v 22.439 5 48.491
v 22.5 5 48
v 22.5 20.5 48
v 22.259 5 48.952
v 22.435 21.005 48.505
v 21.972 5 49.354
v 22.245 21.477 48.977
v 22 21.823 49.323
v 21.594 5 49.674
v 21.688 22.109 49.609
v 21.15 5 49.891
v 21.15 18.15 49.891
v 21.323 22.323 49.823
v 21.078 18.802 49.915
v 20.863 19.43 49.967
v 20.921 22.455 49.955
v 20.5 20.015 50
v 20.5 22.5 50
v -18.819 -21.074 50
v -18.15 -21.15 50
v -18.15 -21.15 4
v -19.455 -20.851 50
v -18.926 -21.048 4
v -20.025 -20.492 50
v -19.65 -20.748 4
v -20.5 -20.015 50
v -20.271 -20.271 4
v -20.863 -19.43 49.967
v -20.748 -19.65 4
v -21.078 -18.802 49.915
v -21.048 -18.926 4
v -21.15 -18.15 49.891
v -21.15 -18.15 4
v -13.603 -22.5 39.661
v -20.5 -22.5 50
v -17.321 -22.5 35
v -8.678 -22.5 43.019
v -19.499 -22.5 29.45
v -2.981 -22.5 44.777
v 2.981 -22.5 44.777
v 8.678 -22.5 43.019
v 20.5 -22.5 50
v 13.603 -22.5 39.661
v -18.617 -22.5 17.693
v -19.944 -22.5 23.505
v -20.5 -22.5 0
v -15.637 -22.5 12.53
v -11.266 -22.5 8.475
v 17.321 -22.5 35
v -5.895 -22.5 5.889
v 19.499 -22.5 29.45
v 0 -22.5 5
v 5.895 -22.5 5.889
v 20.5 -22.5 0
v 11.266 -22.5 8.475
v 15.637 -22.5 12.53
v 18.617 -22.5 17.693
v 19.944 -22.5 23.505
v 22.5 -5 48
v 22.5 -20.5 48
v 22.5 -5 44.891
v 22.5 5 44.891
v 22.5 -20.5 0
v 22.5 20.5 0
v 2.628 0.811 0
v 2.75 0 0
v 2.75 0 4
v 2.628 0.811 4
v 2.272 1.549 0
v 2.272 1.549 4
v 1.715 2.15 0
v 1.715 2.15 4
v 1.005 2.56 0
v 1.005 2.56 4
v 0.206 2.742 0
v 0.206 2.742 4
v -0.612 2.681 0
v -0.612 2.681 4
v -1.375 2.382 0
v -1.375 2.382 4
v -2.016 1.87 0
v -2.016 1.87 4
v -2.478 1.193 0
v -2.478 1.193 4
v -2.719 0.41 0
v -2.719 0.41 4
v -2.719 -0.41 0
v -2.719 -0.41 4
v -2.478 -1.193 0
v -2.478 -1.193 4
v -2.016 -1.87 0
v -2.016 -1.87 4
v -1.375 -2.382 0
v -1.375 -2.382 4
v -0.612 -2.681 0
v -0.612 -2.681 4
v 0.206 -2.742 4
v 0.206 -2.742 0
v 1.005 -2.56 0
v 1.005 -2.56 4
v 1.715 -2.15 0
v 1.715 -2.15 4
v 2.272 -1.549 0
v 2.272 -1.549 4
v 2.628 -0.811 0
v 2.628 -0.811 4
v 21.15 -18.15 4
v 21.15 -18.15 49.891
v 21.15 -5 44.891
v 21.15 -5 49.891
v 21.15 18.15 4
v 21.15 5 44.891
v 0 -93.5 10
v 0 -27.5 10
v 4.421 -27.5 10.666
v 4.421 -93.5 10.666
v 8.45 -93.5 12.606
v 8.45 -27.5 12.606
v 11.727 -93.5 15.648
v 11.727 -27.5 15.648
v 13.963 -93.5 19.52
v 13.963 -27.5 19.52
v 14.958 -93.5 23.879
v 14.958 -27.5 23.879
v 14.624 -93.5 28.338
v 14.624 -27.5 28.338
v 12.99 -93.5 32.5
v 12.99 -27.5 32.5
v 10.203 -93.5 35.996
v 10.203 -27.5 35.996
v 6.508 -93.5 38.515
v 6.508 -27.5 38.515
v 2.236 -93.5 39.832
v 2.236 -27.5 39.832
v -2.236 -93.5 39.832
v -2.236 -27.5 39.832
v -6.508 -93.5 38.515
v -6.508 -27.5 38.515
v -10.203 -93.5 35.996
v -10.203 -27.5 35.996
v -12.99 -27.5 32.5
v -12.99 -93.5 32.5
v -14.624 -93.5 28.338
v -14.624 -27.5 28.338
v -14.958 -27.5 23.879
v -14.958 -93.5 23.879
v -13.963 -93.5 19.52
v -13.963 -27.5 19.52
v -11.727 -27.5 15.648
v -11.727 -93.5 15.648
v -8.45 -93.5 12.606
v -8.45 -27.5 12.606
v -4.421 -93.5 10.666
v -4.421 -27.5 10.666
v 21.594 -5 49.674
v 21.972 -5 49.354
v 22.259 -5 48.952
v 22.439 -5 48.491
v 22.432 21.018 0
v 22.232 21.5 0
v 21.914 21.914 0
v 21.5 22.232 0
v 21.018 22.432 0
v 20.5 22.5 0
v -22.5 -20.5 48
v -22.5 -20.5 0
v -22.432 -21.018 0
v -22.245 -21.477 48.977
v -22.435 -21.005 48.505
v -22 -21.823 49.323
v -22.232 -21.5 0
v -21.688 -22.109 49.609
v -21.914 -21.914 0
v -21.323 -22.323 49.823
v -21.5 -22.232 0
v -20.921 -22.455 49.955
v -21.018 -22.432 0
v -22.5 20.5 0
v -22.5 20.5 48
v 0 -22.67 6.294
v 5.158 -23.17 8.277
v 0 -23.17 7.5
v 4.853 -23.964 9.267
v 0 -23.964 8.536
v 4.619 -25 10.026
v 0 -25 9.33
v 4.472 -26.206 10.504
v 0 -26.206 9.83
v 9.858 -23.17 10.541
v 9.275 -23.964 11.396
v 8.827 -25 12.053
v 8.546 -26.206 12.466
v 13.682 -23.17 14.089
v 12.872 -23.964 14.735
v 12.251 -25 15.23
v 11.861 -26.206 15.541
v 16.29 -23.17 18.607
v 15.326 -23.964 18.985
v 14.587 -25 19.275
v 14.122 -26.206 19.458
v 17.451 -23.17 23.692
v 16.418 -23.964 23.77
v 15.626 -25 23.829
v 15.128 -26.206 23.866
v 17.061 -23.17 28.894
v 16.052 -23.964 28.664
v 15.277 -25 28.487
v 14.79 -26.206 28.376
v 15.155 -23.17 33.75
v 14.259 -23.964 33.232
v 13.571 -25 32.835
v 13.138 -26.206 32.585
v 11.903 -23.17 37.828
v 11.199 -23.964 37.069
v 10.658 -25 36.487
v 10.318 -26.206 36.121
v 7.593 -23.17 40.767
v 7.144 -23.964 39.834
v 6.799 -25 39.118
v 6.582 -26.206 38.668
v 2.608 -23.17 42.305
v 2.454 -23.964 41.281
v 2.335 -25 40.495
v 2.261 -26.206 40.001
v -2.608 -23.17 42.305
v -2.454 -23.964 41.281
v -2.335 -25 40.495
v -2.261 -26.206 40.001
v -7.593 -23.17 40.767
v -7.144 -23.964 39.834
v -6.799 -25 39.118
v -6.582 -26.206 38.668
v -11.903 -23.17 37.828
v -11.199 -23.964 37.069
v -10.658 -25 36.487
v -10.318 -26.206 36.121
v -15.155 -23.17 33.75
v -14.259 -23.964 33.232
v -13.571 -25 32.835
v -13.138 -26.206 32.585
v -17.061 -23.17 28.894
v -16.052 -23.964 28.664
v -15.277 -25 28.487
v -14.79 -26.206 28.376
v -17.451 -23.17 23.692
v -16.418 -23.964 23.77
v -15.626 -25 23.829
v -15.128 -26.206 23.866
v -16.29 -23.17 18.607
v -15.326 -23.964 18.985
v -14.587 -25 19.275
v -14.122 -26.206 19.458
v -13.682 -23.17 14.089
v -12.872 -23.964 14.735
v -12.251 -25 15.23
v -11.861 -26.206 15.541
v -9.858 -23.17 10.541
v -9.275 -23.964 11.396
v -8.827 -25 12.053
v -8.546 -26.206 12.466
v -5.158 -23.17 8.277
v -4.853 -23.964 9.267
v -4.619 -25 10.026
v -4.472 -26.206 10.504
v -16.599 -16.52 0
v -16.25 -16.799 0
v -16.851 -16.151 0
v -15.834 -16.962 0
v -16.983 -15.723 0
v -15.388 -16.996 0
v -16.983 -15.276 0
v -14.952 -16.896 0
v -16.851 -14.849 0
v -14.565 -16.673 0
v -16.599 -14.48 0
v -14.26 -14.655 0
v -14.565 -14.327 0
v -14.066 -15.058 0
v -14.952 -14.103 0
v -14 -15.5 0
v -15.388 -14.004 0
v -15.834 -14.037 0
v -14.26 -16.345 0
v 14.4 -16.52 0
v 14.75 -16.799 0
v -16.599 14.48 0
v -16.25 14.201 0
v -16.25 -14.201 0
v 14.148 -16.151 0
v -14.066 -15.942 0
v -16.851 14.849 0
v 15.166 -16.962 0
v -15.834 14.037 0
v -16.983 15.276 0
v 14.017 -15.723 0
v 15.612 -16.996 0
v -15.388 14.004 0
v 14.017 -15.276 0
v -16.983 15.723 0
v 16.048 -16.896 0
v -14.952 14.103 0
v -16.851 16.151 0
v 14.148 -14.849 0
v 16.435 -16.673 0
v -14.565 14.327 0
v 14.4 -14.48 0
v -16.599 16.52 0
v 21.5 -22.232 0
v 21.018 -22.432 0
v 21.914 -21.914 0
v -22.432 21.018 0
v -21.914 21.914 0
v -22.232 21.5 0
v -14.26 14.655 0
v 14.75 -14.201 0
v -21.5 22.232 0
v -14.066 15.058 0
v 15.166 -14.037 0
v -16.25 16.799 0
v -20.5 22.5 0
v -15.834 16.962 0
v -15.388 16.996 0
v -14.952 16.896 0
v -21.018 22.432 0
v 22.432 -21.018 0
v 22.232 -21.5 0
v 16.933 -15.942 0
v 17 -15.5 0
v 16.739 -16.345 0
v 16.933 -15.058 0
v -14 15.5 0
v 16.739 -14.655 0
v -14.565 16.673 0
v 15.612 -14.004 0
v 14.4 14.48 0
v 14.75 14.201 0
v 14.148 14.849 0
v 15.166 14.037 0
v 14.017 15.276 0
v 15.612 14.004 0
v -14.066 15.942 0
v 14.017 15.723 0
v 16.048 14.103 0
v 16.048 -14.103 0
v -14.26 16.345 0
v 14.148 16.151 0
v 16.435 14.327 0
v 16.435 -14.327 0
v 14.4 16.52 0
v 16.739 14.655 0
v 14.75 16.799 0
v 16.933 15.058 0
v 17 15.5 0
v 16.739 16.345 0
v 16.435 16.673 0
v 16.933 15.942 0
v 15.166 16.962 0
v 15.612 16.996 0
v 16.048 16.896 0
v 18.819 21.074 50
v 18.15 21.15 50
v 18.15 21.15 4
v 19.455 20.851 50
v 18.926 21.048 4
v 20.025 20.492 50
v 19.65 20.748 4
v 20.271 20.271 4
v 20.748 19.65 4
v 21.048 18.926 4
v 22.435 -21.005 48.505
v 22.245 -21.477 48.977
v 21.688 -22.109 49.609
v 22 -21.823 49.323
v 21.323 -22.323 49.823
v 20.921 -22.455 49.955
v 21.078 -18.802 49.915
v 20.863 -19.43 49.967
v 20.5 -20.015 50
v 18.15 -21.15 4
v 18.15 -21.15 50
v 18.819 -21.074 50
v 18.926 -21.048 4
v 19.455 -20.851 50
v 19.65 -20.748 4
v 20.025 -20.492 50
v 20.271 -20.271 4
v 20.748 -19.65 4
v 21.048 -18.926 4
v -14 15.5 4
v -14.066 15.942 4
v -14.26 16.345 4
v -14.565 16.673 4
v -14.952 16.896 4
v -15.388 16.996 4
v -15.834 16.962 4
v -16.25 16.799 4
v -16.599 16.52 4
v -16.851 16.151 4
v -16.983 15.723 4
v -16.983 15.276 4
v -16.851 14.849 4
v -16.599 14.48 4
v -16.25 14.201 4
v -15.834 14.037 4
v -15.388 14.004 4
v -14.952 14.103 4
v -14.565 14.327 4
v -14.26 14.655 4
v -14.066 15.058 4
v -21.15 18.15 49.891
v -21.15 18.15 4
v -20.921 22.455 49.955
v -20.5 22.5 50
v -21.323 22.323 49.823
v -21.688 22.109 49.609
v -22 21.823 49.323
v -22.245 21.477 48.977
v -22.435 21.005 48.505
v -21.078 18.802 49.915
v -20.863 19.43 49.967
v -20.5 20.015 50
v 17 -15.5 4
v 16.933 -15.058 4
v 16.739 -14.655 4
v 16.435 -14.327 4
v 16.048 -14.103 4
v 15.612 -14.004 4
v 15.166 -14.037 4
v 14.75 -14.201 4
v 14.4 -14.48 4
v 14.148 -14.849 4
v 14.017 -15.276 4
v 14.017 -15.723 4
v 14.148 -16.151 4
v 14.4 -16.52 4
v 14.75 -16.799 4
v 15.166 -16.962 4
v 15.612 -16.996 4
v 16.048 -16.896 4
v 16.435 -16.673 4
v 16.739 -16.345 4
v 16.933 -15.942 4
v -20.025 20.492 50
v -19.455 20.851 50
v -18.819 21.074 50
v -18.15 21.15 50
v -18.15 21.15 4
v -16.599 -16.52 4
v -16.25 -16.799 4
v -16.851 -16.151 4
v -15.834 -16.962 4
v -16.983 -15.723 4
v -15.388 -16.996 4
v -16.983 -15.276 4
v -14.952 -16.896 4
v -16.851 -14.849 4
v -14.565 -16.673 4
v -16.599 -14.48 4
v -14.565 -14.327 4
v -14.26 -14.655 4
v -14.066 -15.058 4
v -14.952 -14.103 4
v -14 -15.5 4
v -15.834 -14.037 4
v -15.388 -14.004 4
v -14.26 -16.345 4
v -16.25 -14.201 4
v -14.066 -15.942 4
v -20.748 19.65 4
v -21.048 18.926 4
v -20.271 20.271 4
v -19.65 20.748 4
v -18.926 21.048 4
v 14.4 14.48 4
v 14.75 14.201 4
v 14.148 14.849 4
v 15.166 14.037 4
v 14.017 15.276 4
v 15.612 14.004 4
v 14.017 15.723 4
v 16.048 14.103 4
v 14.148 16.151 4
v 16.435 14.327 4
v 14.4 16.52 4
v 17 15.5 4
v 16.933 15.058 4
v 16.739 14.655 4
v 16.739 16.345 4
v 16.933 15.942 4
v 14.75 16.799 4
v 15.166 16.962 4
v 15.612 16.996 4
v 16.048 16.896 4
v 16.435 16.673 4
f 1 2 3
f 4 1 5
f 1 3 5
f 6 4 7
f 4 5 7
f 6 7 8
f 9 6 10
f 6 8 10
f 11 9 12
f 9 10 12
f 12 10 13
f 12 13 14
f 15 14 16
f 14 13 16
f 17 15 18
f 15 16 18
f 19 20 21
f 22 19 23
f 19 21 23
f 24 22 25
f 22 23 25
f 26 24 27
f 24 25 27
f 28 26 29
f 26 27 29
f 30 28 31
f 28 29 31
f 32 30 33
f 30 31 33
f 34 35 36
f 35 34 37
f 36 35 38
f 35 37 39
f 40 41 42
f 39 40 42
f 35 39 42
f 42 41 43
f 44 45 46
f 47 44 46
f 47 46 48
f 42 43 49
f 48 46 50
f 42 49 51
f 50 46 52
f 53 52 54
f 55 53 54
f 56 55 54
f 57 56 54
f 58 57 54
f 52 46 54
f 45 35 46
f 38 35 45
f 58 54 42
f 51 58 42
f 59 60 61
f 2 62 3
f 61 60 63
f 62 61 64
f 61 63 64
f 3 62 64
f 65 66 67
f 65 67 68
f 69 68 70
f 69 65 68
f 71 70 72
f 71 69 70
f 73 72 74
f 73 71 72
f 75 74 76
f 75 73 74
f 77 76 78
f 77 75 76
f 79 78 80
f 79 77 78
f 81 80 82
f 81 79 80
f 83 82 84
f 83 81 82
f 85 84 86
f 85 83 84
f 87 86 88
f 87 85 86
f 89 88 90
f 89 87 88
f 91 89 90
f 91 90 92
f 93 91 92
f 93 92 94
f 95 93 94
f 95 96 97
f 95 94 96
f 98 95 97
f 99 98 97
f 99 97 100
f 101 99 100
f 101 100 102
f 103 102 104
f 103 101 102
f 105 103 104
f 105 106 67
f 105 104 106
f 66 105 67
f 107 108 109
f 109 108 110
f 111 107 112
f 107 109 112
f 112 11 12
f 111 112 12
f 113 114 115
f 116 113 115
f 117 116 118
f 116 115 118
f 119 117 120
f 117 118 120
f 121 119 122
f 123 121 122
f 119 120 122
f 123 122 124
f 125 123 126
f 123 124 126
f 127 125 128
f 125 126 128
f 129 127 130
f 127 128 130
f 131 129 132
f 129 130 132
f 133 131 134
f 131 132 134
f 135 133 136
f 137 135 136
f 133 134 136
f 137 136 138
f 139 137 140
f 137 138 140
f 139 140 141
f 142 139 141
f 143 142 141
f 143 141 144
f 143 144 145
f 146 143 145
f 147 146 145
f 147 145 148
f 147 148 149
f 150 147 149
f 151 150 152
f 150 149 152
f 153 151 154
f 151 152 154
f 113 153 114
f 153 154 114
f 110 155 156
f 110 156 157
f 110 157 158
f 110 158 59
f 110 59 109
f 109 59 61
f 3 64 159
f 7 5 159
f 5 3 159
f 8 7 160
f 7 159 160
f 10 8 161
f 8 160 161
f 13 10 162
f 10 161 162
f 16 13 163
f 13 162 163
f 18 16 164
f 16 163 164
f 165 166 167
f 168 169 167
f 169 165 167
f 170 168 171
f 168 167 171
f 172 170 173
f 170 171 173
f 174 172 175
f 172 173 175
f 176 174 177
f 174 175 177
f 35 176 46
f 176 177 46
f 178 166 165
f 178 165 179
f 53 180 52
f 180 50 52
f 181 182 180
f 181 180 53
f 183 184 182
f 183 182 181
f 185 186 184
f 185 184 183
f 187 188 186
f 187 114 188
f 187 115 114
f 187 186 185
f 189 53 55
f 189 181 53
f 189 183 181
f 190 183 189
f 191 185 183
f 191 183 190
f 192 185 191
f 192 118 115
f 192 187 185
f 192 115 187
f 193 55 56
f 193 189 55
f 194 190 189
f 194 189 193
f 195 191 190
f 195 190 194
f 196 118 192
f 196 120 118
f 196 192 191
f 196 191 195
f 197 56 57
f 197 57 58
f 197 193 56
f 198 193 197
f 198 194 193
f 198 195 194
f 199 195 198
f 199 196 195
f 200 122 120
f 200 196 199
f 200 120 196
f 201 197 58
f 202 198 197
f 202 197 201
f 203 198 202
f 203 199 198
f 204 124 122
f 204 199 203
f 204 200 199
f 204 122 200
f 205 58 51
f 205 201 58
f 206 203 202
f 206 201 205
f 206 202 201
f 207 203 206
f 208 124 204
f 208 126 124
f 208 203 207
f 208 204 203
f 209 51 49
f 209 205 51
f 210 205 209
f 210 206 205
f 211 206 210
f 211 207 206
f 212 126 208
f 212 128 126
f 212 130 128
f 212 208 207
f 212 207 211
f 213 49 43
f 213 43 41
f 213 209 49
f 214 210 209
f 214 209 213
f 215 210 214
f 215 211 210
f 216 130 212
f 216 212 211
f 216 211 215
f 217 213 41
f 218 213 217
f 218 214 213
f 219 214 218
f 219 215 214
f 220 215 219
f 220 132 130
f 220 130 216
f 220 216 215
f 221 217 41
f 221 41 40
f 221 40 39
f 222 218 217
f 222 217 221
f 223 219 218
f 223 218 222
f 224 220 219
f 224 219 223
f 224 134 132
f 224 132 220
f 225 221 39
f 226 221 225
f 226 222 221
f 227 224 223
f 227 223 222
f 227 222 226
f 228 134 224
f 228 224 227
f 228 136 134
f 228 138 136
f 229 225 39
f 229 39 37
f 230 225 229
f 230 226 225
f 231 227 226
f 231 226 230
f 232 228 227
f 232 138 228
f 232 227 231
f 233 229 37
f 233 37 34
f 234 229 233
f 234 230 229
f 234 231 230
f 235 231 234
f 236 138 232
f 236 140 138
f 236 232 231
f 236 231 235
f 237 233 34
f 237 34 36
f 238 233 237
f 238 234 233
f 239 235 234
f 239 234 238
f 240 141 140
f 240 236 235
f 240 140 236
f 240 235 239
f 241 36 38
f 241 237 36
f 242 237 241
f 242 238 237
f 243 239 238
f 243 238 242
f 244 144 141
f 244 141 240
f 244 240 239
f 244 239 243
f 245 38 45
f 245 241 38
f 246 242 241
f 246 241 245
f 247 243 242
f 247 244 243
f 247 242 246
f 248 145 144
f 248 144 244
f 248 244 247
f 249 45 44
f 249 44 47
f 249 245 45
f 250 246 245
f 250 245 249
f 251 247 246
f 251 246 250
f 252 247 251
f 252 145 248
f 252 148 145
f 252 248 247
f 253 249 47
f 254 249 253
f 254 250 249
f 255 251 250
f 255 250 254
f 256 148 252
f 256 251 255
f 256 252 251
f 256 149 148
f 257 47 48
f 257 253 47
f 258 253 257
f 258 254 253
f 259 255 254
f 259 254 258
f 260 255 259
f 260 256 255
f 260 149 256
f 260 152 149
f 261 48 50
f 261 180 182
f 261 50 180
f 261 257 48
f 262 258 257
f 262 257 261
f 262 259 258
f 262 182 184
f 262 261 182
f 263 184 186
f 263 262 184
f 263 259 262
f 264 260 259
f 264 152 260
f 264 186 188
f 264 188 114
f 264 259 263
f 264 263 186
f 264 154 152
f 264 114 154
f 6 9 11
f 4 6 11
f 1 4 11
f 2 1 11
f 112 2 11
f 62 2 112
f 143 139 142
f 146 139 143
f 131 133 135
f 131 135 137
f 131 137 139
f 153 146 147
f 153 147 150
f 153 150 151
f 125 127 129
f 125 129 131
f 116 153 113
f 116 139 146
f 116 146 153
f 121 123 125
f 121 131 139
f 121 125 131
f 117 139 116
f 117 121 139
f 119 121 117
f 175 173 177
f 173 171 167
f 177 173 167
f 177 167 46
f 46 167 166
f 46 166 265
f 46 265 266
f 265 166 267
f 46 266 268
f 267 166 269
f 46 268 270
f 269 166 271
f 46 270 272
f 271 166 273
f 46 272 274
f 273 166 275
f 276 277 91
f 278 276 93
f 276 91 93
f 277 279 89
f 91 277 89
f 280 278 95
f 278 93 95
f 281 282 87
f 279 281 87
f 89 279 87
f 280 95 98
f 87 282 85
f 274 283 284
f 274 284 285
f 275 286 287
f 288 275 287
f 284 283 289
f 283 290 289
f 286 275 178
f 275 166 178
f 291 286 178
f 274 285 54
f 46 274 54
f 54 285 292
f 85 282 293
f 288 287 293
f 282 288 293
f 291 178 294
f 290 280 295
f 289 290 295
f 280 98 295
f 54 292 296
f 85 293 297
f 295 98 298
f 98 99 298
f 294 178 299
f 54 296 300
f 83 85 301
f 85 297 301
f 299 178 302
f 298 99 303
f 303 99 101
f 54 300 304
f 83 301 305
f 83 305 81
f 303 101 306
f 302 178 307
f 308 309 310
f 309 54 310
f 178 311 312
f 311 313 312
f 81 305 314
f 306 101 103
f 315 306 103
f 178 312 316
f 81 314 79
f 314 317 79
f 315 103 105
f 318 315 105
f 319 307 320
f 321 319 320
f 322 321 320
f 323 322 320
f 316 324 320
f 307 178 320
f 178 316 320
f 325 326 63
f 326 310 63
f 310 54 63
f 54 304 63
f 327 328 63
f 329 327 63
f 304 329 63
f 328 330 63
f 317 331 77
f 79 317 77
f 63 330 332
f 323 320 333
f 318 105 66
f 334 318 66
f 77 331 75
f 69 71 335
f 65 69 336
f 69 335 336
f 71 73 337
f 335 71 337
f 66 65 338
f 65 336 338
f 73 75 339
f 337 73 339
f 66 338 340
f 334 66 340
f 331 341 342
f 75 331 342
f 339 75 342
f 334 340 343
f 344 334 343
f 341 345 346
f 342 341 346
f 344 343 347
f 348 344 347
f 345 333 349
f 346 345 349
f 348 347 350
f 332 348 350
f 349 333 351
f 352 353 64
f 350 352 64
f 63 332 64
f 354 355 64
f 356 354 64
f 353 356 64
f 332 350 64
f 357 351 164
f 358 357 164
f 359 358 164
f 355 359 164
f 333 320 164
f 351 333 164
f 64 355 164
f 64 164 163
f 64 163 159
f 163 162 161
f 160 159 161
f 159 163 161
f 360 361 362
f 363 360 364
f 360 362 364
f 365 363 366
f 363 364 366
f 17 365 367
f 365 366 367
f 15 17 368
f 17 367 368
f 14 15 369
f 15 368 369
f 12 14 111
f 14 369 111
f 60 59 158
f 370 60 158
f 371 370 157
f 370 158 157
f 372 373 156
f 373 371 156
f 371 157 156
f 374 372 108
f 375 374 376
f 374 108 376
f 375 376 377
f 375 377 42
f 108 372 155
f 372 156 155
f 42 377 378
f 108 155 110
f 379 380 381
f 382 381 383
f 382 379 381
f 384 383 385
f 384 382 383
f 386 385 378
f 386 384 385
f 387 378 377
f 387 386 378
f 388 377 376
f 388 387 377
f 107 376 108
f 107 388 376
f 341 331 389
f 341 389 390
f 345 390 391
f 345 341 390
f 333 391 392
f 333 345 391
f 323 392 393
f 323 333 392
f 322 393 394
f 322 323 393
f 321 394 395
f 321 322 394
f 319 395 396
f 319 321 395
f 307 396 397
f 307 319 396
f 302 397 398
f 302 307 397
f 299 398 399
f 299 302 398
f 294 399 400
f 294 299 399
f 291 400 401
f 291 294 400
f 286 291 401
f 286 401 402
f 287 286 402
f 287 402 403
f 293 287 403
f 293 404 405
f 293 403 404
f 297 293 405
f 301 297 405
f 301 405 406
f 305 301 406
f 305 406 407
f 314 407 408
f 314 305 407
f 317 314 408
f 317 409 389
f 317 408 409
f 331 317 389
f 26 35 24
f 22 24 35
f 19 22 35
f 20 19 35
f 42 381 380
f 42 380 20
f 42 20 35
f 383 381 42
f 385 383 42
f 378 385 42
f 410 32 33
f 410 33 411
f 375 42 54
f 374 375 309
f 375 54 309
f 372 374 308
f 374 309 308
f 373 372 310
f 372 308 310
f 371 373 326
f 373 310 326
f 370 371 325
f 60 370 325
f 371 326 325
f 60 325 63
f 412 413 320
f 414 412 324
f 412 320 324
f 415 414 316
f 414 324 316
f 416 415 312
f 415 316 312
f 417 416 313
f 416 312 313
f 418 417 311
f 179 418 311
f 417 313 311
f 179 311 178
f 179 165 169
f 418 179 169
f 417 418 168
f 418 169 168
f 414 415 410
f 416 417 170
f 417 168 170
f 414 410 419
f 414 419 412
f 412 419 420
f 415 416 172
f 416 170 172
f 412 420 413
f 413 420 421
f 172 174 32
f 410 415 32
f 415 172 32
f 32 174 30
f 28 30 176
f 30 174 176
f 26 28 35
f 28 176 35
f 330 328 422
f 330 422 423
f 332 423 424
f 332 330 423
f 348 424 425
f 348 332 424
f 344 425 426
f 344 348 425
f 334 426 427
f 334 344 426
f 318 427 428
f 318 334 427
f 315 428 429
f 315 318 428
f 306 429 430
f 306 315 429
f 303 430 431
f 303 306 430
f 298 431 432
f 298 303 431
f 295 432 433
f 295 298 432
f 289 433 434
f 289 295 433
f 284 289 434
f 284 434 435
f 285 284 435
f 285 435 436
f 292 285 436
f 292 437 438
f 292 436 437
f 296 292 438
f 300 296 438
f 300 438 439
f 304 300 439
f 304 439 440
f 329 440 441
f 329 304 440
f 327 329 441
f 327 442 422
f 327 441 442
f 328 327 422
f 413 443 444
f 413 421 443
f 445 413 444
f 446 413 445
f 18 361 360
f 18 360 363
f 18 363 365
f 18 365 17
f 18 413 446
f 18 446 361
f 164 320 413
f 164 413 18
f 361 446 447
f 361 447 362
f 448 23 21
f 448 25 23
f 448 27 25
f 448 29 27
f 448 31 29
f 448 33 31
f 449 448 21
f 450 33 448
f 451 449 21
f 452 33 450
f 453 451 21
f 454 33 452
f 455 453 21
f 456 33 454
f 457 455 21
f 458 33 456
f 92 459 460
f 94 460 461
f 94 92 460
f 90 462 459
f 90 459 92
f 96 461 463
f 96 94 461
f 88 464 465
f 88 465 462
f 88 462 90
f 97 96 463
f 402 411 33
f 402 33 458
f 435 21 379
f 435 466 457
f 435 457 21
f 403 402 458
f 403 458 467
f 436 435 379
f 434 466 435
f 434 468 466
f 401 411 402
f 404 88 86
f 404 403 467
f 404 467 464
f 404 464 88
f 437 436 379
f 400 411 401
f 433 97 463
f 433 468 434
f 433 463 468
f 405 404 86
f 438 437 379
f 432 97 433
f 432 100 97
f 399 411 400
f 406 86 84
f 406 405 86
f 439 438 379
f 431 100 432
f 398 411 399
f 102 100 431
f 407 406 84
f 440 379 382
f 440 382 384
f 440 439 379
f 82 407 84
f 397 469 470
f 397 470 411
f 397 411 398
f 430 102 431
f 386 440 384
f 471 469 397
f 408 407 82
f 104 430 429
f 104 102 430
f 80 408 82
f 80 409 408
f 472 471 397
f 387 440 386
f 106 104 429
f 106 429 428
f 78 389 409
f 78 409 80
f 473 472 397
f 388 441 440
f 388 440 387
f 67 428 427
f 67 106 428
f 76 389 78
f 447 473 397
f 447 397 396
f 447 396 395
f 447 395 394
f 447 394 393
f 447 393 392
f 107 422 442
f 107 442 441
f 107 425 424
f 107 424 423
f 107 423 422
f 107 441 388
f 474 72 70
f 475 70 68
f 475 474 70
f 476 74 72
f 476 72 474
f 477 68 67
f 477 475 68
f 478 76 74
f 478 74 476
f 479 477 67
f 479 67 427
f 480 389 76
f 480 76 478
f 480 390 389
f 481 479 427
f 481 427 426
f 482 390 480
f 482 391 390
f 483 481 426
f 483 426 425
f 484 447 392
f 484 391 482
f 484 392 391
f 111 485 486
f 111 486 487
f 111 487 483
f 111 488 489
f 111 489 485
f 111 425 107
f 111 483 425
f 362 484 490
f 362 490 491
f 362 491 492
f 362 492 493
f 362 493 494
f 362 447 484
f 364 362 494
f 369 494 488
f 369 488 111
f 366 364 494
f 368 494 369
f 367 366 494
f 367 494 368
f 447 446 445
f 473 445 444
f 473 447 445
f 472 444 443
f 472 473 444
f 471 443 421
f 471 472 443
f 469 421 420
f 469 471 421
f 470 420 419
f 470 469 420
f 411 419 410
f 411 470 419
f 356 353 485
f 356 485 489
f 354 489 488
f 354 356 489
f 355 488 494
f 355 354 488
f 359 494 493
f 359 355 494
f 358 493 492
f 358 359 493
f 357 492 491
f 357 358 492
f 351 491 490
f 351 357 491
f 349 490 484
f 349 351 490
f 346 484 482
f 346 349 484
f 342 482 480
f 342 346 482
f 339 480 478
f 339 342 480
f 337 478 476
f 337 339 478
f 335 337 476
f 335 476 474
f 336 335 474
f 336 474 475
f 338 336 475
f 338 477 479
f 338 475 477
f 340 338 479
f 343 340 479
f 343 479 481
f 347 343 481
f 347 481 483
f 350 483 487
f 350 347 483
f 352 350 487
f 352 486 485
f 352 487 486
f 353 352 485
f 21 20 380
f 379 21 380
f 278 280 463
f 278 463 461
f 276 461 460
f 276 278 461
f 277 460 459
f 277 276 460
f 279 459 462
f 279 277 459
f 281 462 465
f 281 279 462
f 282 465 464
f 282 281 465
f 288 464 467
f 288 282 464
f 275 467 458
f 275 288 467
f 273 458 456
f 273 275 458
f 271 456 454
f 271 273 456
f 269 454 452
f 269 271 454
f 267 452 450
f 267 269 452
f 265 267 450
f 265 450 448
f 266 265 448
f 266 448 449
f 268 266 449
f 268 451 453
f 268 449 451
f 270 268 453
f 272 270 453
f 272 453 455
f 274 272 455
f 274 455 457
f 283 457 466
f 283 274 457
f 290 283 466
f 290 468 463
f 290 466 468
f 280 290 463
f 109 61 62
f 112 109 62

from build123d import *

# Parameters (mm, degrees)
SKETCH1_W               = 45
SKETCH1_H               = 45
BOSS_EXTRUDE1_DEPTH     = 50
SKETCH2_W               = 42.3
SKETCH2_H               = 42.3
CUT_EXTRUDE1_DEPTH      = 46
CUT_EXTRUDE2_DEPTH      = 56.932995629
CUT_EXTRUDE2_DEPTH_BACK = 56.932995629
SKETCH3_R               = 1.5
SKETCH3_R_2             = 2.75
SKETCH4_R               = 15
BOSS_EXTRUDE2_DEPTH     = 71
FILLET1_R               = 2
FILLET2_R               = 5
FILLET3_R               = 3
SKETCH7_W               = 5
SKETCH7_H               = 10
CUT_EXTRUDE3_DEPTH      = 10


with BuildPart() as part:
    # Sketch1 → Boss-Extrude1 (new body)
    with BuildSketch(Plane.XY):
        Rectangle(SKETCH1_W, SKETCH1_H)
    extrude(amount=BOSS_EXTRUDE1_DEPTH)

    # Sketch2 → Cut-Extrude1 (cut)
    with BuildSketch(Plane.XY.offset(50)):
        Rectangle(SKETCH2_W, SKETCH2_H)
    extrude(amount=-CUT_EXTRUDE1_DEPTH, mode=Mode.SUBTRACT)

    # Sketch3 → Cut-Extrude2 (cut, two sides: drawn at the far end of the back side and taken through both)
    with BuildSketch(Plane.XY.offset(4).offset(-CUT_EXTRUDE2_DEPTH_BACK)):
        with Locations((-15.499780644, 15.499780644)):
            Circle(SKETCH3_R)
        with Locations((15.499780644, 15.499780644)):
            Circle(SKETCH3_R)
        with Locations((15.499780644, -15.499780644)):
            Circle(SKETCH3_R)
        with Locations((-15.499780644, -15.499780644)):
            Circle(SKETCH3_R)
        Circle(SKETCH3_R_2)
    extrude(amount=CUT_EXTRUDE2_DEPTH + CUT_EXTRUDE2_DEPTH_BACK, mode=Mode.SUBTRACT)

    # Sketch4 → Boss-Extrude2 (add)
    with BuildSketch(Plane.XZ.offset(22.5)):
        with Locations(Location((0, 25, 0), (0, 0, 270))):
            Circle(SKETCH4_R)
    extrude(amount=BOSS_EXTRUDE2_DEPTH)

    # Fillet1
    # the kernel refuses this fillet: 2 mm, written as the material it takes off along each edge
    with BuildSketch(Plane(origin=(-22.5, -27.5, 50), x_dir=(0, 0, -1), z_dir=(0, 1, 0)), Plane(origin=(22.5, 27.5, 50), x_dir=(0, 0, -1), z_dir=(0, -1, 0))) as fillet1_piece_1:
        with BuildLine():
            CenterArc((FILLET1_R, -FILLET1_R), FILLET1_R, 90, 90)
            Line((0, -FILLET1_R), (0, 0))
            Line((0, 0), (FILLET1_R, 0))
        make_face()
    extrude(amount=55, mode=Mode.SUBTRACT)
    with BuildSketch(Plane(origin=(22.5, -22.5, -5), x_dir=(0, 1, 0), z_dir=(0, 0, 1)), Plane(origin=(22.5, 22.5, -5), x_dir=(-1, 0, 0), z_dir=(0, 0, 1))) as fillet1_piece_2:
        with BuildLine():
            CenterArc((FILLET1_R, FILLET1_R), FILLET1_R, 180, 90)
            Line((0, FILLET1_R), (0, 0))
            Line((0, 0), (FILLET1_R, 0))
        make_face()
    extrude(amount=60, mode=Mode.SUBTRACT)
    with BuildSketch(Plane(origin=(-22.5, -22.5, -5), x_dir=(0, 1, 0), z_dir=(0, 0, 1)), Plane(origin=(-22.5, 22.5, -5), x_dir=(1, 0, 0), z_dir=(0, 0, 1))) as fillet1_piece_3:
        with BuildLine():
            CenterArc((FILLET1_R, -FILLET1_R), FILLET1_R, 90, 90)
            Line((0, -FILLET1_R), (0, 0))
            Line((0, 0), (FILLET1_R, 0))
        make_face()
    extrude(amount=60, mode=Mode.SUBTRACT)

    # Fillet2
    fillet2_edges = [part.edges().sort_by_distance(p)[0] for p in [
        (0, -22.5, 40),
    ]]
    fillet(fillet2_edges, radius=FILLET2_R)

    # Fillet3
    fillet3_edges = [part.edges().sort_by_distance(p)[0] for p in [
        (-21.15, -21.15, 26.945714016),
        (21.15, 21.15, 26.945714016),
        (-21.15, 21.15, 26.945714016),
        (21.15, -21.15, 26.945714016),
    ]]
    fillet(fillet3_edges, radius=FILLET3_R)

    # Sketch7 → Cut-Extrude3 (cut)
    with BuildSketch(Plane(origin=(22.5, 0, 0), x_dir=(0, 0, -1), z_dir=(1, 0, 0))):
        with Locations((-47.391428032, 0)):
            Rectangle(SKETCH7_W, SKETCH7_H)
    extrude(amount=-CUT_EXTRUDE3_DEPTH, mode=Mode.SUBTRACT)


solid = part.part
